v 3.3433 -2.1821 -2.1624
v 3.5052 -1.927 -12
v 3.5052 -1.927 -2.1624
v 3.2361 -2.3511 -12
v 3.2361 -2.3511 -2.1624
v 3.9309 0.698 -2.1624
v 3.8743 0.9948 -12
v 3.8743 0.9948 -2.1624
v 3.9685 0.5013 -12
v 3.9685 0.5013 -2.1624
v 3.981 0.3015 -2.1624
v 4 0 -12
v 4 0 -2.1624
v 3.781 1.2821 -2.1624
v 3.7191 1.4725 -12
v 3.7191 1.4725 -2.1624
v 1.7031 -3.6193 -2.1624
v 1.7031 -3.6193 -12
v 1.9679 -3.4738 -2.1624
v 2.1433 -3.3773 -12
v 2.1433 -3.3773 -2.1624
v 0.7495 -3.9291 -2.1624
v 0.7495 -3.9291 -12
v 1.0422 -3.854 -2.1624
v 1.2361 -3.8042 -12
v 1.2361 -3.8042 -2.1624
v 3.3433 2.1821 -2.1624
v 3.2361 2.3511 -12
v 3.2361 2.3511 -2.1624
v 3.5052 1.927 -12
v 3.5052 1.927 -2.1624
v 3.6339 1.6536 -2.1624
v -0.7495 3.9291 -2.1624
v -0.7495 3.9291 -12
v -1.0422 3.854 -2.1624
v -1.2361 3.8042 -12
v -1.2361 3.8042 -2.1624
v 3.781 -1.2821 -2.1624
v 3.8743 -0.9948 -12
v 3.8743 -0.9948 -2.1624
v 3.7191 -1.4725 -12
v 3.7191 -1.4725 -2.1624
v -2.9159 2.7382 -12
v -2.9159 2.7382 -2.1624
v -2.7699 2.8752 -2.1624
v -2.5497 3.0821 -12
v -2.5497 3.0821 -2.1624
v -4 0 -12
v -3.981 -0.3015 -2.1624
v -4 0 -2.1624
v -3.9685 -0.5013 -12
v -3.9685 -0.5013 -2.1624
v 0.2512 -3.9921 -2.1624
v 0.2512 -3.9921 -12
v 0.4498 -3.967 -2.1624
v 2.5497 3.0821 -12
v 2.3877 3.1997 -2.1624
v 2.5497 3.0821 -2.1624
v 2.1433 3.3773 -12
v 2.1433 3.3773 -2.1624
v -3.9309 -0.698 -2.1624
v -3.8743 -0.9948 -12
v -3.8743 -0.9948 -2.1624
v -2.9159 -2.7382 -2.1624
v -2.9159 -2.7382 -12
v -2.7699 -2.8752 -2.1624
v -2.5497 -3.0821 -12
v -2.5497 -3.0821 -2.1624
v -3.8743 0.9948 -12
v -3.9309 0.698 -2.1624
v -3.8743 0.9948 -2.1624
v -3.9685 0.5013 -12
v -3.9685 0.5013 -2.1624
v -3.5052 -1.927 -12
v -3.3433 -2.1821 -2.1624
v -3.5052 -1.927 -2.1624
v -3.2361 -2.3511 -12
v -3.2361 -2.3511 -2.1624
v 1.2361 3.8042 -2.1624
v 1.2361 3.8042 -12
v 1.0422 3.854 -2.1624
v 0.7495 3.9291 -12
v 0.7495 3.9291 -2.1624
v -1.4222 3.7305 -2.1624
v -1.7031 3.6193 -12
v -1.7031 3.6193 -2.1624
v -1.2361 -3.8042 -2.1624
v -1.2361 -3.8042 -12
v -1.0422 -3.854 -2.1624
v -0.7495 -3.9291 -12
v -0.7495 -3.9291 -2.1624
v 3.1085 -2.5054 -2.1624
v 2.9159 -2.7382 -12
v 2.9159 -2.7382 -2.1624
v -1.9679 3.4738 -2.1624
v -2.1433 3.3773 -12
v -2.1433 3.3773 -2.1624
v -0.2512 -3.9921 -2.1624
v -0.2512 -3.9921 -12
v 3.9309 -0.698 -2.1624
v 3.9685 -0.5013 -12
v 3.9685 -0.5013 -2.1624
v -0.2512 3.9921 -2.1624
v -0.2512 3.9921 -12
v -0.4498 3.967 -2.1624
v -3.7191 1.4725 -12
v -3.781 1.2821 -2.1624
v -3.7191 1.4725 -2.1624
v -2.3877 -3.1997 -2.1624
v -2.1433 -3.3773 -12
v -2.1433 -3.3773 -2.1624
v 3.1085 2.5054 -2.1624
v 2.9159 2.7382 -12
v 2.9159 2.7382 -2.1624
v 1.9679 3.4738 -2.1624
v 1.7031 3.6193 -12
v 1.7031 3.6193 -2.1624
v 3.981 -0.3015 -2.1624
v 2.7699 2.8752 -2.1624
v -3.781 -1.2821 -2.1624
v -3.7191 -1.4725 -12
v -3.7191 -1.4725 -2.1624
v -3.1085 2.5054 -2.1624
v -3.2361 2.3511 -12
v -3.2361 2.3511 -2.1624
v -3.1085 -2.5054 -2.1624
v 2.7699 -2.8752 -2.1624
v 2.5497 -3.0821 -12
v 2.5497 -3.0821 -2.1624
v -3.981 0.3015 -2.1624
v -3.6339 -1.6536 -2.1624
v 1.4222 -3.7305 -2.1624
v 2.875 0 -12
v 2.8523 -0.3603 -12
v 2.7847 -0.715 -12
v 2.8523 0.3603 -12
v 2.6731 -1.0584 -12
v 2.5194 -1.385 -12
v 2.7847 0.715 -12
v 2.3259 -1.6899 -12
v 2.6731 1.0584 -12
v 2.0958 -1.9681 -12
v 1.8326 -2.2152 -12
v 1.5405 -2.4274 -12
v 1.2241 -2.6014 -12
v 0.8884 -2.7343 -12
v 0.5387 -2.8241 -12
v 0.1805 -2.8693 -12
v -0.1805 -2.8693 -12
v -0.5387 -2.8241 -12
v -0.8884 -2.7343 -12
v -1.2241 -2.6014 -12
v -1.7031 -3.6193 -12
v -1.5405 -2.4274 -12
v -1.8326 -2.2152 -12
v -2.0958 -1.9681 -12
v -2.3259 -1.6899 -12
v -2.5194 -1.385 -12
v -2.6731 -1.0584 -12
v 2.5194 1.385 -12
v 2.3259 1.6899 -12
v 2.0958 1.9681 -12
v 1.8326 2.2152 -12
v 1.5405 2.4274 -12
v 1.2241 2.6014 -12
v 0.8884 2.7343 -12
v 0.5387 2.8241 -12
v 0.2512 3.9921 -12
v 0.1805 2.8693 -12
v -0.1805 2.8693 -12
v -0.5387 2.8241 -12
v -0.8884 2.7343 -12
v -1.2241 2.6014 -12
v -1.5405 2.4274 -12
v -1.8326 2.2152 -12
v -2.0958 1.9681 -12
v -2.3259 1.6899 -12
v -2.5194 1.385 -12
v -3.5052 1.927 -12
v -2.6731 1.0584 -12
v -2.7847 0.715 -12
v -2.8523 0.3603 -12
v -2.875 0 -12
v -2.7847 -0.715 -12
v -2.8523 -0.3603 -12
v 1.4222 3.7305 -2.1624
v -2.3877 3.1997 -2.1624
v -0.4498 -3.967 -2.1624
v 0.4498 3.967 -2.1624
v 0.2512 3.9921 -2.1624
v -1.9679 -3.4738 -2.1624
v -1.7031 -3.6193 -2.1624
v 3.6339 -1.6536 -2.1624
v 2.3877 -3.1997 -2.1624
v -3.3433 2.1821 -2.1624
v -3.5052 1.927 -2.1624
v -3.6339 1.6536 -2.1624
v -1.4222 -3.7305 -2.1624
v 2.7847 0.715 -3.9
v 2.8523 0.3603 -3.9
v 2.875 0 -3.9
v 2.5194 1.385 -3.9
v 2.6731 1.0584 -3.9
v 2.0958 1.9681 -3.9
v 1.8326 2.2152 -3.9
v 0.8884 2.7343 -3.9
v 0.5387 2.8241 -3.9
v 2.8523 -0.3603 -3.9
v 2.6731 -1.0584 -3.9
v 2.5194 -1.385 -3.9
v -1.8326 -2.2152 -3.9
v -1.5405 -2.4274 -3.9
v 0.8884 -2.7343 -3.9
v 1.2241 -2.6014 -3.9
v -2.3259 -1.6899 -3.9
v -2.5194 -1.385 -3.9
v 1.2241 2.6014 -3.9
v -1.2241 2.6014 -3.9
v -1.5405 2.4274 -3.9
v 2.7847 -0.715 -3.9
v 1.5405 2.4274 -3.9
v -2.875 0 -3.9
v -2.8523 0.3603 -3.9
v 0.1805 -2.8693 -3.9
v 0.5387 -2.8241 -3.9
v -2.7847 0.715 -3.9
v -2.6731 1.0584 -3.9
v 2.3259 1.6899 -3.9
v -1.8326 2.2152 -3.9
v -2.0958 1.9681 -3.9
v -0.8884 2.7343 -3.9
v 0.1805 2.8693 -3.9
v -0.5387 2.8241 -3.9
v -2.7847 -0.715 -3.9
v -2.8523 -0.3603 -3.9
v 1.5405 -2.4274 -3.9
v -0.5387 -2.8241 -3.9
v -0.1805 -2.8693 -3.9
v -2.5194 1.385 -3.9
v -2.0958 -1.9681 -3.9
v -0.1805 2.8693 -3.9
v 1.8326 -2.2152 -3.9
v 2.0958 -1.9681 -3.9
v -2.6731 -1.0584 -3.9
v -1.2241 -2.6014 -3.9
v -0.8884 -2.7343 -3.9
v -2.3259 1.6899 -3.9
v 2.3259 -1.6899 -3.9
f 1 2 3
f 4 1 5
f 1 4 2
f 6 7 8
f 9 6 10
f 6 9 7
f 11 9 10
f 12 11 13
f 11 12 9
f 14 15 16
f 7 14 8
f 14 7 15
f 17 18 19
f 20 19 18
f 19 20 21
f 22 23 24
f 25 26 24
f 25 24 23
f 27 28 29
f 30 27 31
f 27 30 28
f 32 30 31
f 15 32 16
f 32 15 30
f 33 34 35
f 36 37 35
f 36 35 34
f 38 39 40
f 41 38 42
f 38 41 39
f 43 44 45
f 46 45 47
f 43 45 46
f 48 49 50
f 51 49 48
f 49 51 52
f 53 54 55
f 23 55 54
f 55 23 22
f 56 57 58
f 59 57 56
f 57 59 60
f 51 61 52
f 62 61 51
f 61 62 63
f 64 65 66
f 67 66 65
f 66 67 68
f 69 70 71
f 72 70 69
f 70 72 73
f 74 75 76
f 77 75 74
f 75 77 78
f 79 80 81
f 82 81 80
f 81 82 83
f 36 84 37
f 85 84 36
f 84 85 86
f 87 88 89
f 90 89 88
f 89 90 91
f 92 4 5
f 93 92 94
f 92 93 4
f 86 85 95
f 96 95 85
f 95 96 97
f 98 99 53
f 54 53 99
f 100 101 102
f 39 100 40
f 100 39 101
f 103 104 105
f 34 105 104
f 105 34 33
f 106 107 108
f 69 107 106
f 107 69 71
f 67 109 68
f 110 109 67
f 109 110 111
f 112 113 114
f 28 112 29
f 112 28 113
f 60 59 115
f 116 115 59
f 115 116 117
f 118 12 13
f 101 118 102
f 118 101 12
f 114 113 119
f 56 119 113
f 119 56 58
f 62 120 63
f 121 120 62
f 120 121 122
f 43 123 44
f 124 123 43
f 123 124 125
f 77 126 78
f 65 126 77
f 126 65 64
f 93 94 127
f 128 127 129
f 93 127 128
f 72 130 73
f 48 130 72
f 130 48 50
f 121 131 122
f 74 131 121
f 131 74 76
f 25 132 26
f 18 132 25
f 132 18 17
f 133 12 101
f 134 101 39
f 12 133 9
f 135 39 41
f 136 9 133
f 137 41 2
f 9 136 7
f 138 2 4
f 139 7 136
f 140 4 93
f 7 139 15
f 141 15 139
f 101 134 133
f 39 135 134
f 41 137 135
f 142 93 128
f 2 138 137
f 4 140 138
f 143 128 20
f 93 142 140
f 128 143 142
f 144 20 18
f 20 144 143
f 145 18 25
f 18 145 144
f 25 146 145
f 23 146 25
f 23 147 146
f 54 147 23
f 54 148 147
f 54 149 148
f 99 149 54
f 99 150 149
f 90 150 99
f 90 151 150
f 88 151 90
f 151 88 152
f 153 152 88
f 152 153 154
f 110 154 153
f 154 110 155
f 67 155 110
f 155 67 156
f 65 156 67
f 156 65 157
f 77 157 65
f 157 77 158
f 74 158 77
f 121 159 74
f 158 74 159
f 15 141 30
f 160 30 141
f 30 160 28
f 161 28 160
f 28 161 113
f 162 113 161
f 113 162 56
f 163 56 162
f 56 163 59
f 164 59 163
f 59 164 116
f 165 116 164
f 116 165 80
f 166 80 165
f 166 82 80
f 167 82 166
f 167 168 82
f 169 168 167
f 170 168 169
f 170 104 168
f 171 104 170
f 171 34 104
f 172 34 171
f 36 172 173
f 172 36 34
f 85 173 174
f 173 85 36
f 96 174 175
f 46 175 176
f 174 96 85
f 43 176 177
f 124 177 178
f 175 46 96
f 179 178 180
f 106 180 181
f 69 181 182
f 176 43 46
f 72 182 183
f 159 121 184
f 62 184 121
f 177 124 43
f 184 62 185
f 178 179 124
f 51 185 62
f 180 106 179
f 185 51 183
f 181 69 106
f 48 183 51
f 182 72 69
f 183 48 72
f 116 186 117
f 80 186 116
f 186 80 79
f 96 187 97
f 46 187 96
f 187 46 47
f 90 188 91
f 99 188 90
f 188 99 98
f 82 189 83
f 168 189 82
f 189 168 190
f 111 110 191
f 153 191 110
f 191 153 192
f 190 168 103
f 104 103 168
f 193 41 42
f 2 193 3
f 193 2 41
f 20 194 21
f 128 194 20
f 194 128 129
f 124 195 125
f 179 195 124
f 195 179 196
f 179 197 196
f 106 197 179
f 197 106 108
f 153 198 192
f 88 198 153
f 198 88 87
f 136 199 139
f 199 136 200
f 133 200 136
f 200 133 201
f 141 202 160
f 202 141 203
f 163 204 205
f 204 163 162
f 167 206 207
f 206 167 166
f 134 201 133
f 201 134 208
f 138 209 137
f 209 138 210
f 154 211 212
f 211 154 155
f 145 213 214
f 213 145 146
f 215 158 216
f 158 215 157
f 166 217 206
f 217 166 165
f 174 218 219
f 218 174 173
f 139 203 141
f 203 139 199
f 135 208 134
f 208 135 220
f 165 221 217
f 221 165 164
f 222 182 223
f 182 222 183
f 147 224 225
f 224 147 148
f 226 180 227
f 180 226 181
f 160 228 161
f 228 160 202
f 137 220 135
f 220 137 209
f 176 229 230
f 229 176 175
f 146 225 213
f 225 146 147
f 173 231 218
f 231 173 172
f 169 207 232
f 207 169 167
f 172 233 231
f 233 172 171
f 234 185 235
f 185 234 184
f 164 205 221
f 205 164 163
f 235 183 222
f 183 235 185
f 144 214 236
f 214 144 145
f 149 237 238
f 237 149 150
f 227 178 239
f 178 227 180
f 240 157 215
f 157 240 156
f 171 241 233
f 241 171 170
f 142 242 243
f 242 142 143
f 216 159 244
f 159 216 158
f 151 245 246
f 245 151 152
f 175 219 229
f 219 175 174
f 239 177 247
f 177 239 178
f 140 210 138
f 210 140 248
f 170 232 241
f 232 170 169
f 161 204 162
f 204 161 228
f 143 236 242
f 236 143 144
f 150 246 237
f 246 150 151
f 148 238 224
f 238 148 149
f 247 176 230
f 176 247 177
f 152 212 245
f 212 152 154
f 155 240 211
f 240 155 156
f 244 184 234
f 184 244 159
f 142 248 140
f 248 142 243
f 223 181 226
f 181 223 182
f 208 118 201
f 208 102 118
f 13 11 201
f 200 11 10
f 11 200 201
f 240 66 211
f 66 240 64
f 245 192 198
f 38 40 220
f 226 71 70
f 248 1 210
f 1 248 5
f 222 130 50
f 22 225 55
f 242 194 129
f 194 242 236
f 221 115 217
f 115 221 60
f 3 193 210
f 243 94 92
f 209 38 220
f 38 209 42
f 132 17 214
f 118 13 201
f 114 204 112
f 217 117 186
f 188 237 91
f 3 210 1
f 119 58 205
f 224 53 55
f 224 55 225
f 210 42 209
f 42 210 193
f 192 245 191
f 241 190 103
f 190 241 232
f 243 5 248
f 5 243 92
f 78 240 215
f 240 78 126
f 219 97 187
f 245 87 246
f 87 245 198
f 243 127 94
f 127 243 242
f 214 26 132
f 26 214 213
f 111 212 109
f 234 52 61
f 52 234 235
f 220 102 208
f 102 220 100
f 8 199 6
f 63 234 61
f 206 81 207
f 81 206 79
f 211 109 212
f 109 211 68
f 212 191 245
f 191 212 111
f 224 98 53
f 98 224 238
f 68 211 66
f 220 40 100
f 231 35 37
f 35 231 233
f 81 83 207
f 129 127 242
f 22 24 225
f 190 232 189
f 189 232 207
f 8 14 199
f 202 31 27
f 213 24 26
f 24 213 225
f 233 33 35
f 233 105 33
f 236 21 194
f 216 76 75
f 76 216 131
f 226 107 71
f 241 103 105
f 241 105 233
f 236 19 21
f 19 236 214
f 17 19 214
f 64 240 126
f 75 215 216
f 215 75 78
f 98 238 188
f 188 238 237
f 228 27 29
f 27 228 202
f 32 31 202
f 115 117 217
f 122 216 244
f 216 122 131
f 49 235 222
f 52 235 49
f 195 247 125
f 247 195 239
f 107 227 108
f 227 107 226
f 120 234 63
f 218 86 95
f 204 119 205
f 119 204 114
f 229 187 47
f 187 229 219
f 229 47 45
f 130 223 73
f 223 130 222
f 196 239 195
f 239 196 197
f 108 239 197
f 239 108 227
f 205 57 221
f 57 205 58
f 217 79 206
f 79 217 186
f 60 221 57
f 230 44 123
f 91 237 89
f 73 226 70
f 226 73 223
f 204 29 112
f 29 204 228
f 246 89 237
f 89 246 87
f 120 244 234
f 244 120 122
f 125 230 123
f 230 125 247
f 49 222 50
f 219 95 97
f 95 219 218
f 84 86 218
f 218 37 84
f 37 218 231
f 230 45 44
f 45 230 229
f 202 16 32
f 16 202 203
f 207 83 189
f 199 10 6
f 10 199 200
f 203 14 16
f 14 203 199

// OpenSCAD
$fn = 50;

difference() {
	union() {
		translate(v = [0, 0, -12.0]) {
			cylinder(h = 15, r = 4.0);
		}
		#translate(v = [0, 0, -15.0]) {
			cylinder(h = 15, r = 2.875);
		}
	}
	union() {
		translate(v = [0, 0, 0]) {
			rotate(a = [0, 0, 0]) {
				difference() {
					union() {
						translate(v = [0, 0, -15.0]) {
							cylinder(h = 15, r = 2.6);
						}
						translate(v = [0, 0, -3.9]) {
							cylinder(h = 3.9, r1 = 2.875, r2 = 5.4);
						}
						translate(v = [0, 0, -15.0]) {
							cylinder(h = 15, r = 2.875);
						}
						translate(v = [0, 0, -15.0]) {
							cylinder(h = 15, r = 2.6);
						}
					}
					union();
				}
			}
		}
		#cylinder(h = 3, r = 5.0);
	}
}
